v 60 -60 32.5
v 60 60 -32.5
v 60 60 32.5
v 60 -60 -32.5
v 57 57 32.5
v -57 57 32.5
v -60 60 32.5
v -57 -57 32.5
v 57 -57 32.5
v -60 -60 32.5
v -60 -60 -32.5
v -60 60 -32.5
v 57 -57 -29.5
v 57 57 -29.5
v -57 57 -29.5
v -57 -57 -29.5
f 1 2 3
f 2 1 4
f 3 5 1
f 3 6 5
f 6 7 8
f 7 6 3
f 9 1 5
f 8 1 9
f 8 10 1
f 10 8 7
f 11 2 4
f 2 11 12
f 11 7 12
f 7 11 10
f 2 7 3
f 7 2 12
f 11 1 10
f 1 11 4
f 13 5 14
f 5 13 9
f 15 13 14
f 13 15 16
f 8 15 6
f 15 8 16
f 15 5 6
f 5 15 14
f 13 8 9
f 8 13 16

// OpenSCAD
// ========================================
// a 120 x 120 x 65 mm enclosure with 3 mm wall thickness
// NeuroCAD canonical IR; dimensions are millimetres
// ========================================
$fn = 48;

difference() {
  cube(size=[120, 120, 65], center=true);
  translate([0, 0, 1.6]) {
    cube(size=[114, 114, 62.2], center=true);
  }
}
